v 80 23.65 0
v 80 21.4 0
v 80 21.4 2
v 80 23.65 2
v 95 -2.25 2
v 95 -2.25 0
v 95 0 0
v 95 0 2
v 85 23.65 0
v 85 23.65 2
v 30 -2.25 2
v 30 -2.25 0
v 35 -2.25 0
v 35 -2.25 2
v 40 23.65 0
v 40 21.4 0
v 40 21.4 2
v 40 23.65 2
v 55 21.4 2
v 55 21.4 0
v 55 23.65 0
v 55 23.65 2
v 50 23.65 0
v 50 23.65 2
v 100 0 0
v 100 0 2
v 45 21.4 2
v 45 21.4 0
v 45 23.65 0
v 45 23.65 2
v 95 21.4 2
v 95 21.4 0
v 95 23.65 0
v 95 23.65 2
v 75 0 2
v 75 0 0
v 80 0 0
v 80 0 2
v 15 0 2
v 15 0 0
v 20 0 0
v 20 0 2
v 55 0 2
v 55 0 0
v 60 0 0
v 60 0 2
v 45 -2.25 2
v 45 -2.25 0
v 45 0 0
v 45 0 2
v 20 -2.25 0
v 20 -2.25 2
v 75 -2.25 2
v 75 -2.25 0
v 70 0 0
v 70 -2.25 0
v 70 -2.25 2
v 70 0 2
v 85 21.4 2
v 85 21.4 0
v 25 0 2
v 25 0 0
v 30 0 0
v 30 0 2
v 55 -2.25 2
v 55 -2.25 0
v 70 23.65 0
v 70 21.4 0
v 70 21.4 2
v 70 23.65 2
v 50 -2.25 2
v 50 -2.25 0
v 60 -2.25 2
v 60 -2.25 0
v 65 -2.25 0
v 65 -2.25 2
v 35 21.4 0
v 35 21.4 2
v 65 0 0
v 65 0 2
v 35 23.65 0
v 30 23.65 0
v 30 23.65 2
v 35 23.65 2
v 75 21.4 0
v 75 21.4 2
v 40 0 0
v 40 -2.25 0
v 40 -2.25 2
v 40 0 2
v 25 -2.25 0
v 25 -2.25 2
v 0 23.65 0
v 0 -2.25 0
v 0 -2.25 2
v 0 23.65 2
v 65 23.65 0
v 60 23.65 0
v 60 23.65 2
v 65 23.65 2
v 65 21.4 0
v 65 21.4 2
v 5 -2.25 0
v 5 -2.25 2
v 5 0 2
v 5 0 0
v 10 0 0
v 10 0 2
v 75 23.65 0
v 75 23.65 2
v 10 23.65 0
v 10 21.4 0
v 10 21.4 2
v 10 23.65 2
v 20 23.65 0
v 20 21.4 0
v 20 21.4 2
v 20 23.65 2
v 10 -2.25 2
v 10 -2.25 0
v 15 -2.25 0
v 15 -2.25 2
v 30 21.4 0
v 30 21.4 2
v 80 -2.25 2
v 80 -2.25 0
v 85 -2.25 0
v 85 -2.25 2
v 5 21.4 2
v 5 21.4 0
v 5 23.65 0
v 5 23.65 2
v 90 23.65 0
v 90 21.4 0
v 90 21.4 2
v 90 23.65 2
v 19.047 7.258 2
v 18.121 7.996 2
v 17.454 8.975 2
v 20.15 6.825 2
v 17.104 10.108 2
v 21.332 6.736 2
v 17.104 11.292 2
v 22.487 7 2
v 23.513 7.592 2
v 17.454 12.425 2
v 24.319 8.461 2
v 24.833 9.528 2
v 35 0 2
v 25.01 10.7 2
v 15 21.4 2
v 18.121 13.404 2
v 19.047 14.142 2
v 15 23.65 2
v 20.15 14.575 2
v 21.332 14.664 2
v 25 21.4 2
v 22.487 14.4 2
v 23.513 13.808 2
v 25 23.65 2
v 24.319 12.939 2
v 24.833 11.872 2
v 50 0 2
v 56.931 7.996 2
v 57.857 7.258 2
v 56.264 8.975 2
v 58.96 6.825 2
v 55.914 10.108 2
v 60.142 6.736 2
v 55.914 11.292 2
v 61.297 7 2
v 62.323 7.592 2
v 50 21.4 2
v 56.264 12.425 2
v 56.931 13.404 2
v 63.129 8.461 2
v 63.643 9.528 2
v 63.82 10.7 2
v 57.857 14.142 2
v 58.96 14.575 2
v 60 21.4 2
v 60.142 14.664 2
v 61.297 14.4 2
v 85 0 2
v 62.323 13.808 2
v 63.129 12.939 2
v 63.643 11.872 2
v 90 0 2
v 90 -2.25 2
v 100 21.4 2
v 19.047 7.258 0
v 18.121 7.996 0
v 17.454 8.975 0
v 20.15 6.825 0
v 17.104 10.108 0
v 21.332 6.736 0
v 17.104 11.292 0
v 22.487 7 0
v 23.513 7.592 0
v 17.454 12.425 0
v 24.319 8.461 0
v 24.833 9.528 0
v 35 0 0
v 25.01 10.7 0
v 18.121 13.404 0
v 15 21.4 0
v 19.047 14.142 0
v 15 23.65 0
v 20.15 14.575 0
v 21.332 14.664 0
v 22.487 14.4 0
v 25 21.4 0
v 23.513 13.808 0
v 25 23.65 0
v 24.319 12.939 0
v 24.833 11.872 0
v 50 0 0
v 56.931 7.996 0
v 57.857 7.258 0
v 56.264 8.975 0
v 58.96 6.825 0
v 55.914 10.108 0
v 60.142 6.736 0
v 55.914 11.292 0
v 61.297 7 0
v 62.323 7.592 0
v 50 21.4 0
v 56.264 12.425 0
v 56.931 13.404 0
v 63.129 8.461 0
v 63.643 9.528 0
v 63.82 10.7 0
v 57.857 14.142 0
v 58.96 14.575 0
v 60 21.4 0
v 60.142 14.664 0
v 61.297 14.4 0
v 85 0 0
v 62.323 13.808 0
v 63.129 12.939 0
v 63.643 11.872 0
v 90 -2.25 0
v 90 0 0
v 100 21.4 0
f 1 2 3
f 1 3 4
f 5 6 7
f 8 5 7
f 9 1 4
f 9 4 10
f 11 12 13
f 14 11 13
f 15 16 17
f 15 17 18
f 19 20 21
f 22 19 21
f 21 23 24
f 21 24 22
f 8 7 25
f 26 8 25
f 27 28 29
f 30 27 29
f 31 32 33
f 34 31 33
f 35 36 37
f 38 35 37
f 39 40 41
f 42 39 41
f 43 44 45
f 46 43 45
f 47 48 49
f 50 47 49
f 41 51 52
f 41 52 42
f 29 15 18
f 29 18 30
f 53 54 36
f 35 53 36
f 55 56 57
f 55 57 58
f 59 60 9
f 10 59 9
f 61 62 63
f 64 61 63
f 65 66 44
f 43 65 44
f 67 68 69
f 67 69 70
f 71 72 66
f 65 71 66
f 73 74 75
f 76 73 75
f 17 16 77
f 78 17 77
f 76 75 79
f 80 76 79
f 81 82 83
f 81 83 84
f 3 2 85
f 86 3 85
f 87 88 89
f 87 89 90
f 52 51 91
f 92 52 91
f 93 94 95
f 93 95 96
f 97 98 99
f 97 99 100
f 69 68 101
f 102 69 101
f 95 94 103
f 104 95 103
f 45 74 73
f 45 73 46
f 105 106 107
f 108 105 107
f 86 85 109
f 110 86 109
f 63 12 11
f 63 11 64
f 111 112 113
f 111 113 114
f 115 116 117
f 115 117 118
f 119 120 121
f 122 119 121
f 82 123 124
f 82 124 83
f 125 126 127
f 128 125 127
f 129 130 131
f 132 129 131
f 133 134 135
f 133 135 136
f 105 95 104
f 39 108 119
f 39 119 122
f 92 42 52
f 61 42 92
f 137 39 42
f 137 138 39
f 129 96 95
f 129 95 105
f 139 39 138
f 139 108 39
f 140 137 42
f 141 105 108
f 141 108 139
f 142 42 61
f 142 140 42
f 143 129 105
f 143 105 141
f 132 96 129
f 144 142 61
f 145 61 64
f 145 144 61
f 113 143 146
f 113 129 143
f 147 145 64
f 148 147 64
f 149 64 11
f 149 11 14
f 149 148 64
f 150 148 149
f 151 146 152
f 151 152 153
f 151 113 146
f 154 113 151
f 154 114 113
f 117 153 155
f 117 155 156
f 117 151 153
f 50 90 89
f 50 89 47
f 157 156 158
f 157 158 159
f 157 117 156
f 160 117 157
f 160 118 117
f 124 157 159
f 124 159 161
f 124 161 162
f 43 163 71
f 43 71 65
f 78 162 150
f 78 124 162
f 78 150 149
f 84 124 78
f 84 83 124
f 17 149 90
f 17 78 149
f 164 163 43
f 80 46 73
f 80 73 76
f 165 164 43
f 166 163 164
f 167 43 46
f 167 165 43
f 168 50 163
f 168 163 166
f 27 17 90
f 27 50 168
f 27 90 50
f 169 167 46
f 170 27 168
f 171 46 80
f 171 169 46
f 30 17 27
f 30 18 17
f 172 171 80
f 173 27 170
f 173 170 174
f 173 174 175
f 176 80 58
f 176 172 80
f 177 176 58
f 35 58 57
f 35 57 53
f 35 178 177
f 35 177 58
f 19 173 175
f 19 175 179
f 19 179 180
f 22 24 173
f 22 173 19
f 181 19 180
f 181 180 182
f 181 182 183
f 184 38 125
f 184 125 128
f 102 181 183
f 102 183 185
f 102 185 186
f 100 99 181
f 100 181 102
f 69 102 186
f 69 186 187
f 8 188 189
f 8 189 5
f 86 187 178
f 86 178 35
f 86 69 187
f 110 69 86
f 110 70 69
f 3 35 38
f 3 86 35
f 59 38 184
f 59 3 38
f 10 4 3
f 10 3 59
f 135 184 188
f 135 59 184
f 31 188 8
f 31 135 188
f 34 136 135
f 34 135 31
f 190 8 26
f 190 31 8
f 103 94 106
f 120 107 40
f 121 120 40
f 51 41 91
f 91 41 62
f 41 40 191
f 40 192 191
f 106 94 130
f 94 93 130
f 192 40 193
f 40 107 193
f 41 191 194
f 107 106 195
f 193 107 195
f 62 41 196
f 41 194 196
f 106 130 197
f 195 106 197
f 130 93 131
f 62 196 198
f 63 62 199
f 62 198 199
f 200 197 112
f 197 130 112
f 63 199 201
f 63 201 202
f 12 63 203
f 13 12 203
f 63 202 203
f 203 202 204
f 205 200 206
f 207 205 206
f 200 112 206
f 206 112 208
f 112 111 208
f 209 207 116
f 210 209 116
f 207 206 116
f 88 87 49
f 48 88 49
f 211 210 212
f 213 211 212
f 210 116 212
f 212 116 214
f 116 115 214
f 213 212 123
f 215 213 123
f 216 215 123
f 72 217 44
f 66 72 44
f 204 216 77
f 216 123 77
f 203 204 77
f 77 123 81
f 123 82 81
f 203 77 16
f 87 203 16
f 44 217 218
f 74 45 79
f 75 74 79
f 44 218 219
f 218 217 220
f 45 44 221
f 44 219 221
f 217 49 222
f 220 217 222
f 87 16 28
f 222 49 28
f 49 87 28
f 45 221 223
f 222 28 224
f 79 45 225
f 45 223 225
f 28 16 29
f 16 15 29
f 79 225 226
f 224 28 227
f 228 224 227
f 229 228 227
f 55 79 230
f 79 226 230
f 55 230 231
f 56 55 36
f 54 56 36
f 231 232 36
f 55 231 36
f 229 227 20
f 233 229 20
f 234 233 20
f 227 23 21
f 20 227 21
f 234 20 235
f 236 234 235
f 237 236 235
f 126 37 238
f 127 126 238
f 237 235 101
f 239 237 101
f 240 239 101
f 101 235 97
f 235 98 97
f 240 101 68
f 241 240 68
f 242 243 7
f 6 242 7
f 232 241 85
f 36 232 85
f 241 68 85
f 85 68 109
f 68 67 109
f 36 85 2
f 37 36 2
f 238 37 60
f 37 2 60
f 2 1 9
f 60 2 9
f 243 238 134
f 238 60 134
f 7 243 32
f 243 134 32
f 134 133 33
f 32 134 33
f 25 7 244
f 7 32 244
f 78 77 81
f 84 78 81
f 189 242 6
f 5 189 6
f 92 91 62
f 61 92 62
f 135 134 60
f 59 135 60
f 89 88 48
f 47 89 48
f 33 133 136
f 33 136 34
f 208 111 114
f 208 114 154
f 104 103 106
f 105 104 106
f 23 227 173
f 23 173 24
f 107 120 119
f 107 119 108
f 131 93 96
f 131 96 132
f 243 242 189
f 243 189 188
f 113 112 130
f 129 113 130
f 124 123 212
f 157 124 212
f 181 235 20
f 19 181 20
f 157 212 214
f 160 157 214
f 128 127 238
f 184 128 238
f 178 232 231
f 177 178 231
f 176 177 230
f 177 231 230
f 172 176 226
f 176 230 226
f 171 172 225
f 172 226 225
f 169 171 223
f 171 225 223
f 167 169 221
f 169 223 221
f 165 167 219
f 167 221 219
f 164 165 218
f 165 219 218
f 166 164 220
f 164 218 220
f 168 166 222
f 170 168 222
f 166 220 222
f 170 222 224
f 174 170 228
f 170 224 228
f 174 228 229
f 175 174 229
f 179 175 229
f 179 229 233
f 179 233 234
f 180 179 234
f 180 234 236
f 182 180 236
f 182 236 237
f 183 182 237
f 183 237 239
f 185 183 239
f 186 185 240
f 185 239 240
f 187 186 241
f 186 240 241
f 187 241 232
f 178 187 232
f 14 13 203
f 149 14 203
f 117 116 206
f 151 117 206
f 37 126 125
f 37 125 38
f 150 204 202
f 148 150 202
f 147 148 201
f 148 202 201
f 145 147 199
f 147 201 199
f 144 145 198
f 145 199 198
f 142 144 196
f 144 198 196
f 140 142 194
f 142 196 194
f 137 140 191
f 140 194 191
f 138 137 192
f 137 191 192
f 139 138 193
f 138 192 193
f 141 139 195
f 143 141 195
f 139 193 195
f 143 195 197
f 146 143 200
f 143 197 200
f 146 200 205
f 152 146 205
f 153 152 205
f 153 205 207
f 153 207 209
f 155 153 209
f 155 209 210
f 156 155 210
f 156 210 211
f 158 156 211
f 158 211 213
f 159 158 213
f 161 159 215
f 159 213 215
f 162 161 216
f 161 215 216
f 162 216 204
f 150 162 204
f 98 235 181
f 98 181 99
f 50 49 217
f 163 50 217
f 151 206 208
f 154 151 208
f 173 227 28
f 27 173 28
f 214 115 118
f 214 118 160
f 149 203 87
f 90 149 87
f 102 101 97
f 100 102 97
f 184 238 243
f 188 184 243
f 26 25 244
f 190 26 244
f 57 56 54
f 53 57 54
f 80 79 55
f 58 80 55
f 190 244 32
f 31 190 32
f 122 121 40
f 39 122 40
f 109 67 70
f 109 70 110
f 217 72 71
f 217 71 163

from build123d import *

# Parameters (mm, degrees)
SKETCH1_W           = 100
SKETCH1_H           = 21.4
SKETCH1_R           = 3.975
BOSS_EXTRUDE2_DEPTH = 2
SKETCH1_6_W         = 5
SKETCH1_6_H         = 2.25
BOSS_EXTRUDE4_DEPTH = 2


with BuildPart() as part:
    # Sketch1 → Boss-Extrude2 (new body)
    with BuildSketch(Plane.XY):
        with Locations((50, 10.7)):
            Rectangle(SKETCH1_W, SKETCH1_H)
        with Locations((59.844934973, 10.7)):
            Circle(SKETCH1_R, mode=Mode.SUBTRACT)
        with Locations((21.034934973, 10.7)):
            Circle(SKETCH1_R, mode=Mode.SUBTRACT)
    extrude(amount=BOSS_EXTRUDE2_DEPTH)

    # Sketch1<6> → Boss-Extrude4 (add)
    with BuildSketch(Plane.XY):
        with Locations((2.5, -1.125)):
            Rectangle(SKETCH1_6_W, SKETCH1_6_H)
        with Locations((2.5, 22.525)):
            Rectangle(SKETCH1_6_W, SKETCH1_6_H)
        with Locations((12.5, -1.125)):
            Rectangle(SKETCH1_6_W, SKETCH1_6_H)
        with Locations((12.5, 22.525)):
            Rectangle(SKETCH1_6_W, SKETCH1_6_H)
        with Locations((22.5, -1.125)):
            Rectangle(SKETCH1_6_W, SKETCH1_6_H)
        with Locations((22.5, 22.525)):
            Rectangle(SKETCH1_6_W, SKETCH1_6_H)
        with Locations((32.5, -1.125)):
            Rectangle(SKETCH1_6_W, SKETCH1_6_H)
        with Locations((32.5, 22.525)):
            Rectangle(SKETCH1_6_W, SKETCH1_6_H)
        with Locations((42.5, -1.125)):
            Rectangle(SKETCH1_6_W, SKETCH1_6_H)
        with Locations((42.5, 22.525)):
            Rectangle(SKETCH1_6_W, SKETCH1_6_H)
        with Locations((52.5, -1.125)):
            Rectangle(SKETCH1_6_W, SKETCH1_6_H)
        with Locations((52.5, 22.525)):
            Rectangle(SKETCH1_6_W, SKETCH1_6_H)
        with Locations((62.5, -1.125)):
            Rectangle(SKETCH1_6_W, SKETCH1_6_H)
        with Locations((62.5, 22.525)):
            Rectangle(SKETCH1_6_W, SKETCH1_6_H)
        with Locations((72.5, -1.125)):
            Rectangle(SKETCH1_6_W, SKETCH1_6_H)
        with Locations((72.5, 22.525)):
            Rectangle(SKETCH1_6_W, SKETCH1_6_H)
        with Locations((82.5, -1.125)):
            Rectangle(SKETCH1_6_W, SKETCH1_6_H)
        with Locations((82.5, 22.525)):
            Rectangle(SKETCH1_6_W, SKETCH1_6_H)
        with Locations((92.5, -1.125)):
            Rectangle(SKETCH1_6_W, SKETCH1_6_H)
        with Locations((92.5, 22.525)):
            Rectangle(SKETCH1_6_W, SKETCH1_6_H)
    extrude(amount=BOSS_EXTRUDE4_DEPTH)


solid = part.part
